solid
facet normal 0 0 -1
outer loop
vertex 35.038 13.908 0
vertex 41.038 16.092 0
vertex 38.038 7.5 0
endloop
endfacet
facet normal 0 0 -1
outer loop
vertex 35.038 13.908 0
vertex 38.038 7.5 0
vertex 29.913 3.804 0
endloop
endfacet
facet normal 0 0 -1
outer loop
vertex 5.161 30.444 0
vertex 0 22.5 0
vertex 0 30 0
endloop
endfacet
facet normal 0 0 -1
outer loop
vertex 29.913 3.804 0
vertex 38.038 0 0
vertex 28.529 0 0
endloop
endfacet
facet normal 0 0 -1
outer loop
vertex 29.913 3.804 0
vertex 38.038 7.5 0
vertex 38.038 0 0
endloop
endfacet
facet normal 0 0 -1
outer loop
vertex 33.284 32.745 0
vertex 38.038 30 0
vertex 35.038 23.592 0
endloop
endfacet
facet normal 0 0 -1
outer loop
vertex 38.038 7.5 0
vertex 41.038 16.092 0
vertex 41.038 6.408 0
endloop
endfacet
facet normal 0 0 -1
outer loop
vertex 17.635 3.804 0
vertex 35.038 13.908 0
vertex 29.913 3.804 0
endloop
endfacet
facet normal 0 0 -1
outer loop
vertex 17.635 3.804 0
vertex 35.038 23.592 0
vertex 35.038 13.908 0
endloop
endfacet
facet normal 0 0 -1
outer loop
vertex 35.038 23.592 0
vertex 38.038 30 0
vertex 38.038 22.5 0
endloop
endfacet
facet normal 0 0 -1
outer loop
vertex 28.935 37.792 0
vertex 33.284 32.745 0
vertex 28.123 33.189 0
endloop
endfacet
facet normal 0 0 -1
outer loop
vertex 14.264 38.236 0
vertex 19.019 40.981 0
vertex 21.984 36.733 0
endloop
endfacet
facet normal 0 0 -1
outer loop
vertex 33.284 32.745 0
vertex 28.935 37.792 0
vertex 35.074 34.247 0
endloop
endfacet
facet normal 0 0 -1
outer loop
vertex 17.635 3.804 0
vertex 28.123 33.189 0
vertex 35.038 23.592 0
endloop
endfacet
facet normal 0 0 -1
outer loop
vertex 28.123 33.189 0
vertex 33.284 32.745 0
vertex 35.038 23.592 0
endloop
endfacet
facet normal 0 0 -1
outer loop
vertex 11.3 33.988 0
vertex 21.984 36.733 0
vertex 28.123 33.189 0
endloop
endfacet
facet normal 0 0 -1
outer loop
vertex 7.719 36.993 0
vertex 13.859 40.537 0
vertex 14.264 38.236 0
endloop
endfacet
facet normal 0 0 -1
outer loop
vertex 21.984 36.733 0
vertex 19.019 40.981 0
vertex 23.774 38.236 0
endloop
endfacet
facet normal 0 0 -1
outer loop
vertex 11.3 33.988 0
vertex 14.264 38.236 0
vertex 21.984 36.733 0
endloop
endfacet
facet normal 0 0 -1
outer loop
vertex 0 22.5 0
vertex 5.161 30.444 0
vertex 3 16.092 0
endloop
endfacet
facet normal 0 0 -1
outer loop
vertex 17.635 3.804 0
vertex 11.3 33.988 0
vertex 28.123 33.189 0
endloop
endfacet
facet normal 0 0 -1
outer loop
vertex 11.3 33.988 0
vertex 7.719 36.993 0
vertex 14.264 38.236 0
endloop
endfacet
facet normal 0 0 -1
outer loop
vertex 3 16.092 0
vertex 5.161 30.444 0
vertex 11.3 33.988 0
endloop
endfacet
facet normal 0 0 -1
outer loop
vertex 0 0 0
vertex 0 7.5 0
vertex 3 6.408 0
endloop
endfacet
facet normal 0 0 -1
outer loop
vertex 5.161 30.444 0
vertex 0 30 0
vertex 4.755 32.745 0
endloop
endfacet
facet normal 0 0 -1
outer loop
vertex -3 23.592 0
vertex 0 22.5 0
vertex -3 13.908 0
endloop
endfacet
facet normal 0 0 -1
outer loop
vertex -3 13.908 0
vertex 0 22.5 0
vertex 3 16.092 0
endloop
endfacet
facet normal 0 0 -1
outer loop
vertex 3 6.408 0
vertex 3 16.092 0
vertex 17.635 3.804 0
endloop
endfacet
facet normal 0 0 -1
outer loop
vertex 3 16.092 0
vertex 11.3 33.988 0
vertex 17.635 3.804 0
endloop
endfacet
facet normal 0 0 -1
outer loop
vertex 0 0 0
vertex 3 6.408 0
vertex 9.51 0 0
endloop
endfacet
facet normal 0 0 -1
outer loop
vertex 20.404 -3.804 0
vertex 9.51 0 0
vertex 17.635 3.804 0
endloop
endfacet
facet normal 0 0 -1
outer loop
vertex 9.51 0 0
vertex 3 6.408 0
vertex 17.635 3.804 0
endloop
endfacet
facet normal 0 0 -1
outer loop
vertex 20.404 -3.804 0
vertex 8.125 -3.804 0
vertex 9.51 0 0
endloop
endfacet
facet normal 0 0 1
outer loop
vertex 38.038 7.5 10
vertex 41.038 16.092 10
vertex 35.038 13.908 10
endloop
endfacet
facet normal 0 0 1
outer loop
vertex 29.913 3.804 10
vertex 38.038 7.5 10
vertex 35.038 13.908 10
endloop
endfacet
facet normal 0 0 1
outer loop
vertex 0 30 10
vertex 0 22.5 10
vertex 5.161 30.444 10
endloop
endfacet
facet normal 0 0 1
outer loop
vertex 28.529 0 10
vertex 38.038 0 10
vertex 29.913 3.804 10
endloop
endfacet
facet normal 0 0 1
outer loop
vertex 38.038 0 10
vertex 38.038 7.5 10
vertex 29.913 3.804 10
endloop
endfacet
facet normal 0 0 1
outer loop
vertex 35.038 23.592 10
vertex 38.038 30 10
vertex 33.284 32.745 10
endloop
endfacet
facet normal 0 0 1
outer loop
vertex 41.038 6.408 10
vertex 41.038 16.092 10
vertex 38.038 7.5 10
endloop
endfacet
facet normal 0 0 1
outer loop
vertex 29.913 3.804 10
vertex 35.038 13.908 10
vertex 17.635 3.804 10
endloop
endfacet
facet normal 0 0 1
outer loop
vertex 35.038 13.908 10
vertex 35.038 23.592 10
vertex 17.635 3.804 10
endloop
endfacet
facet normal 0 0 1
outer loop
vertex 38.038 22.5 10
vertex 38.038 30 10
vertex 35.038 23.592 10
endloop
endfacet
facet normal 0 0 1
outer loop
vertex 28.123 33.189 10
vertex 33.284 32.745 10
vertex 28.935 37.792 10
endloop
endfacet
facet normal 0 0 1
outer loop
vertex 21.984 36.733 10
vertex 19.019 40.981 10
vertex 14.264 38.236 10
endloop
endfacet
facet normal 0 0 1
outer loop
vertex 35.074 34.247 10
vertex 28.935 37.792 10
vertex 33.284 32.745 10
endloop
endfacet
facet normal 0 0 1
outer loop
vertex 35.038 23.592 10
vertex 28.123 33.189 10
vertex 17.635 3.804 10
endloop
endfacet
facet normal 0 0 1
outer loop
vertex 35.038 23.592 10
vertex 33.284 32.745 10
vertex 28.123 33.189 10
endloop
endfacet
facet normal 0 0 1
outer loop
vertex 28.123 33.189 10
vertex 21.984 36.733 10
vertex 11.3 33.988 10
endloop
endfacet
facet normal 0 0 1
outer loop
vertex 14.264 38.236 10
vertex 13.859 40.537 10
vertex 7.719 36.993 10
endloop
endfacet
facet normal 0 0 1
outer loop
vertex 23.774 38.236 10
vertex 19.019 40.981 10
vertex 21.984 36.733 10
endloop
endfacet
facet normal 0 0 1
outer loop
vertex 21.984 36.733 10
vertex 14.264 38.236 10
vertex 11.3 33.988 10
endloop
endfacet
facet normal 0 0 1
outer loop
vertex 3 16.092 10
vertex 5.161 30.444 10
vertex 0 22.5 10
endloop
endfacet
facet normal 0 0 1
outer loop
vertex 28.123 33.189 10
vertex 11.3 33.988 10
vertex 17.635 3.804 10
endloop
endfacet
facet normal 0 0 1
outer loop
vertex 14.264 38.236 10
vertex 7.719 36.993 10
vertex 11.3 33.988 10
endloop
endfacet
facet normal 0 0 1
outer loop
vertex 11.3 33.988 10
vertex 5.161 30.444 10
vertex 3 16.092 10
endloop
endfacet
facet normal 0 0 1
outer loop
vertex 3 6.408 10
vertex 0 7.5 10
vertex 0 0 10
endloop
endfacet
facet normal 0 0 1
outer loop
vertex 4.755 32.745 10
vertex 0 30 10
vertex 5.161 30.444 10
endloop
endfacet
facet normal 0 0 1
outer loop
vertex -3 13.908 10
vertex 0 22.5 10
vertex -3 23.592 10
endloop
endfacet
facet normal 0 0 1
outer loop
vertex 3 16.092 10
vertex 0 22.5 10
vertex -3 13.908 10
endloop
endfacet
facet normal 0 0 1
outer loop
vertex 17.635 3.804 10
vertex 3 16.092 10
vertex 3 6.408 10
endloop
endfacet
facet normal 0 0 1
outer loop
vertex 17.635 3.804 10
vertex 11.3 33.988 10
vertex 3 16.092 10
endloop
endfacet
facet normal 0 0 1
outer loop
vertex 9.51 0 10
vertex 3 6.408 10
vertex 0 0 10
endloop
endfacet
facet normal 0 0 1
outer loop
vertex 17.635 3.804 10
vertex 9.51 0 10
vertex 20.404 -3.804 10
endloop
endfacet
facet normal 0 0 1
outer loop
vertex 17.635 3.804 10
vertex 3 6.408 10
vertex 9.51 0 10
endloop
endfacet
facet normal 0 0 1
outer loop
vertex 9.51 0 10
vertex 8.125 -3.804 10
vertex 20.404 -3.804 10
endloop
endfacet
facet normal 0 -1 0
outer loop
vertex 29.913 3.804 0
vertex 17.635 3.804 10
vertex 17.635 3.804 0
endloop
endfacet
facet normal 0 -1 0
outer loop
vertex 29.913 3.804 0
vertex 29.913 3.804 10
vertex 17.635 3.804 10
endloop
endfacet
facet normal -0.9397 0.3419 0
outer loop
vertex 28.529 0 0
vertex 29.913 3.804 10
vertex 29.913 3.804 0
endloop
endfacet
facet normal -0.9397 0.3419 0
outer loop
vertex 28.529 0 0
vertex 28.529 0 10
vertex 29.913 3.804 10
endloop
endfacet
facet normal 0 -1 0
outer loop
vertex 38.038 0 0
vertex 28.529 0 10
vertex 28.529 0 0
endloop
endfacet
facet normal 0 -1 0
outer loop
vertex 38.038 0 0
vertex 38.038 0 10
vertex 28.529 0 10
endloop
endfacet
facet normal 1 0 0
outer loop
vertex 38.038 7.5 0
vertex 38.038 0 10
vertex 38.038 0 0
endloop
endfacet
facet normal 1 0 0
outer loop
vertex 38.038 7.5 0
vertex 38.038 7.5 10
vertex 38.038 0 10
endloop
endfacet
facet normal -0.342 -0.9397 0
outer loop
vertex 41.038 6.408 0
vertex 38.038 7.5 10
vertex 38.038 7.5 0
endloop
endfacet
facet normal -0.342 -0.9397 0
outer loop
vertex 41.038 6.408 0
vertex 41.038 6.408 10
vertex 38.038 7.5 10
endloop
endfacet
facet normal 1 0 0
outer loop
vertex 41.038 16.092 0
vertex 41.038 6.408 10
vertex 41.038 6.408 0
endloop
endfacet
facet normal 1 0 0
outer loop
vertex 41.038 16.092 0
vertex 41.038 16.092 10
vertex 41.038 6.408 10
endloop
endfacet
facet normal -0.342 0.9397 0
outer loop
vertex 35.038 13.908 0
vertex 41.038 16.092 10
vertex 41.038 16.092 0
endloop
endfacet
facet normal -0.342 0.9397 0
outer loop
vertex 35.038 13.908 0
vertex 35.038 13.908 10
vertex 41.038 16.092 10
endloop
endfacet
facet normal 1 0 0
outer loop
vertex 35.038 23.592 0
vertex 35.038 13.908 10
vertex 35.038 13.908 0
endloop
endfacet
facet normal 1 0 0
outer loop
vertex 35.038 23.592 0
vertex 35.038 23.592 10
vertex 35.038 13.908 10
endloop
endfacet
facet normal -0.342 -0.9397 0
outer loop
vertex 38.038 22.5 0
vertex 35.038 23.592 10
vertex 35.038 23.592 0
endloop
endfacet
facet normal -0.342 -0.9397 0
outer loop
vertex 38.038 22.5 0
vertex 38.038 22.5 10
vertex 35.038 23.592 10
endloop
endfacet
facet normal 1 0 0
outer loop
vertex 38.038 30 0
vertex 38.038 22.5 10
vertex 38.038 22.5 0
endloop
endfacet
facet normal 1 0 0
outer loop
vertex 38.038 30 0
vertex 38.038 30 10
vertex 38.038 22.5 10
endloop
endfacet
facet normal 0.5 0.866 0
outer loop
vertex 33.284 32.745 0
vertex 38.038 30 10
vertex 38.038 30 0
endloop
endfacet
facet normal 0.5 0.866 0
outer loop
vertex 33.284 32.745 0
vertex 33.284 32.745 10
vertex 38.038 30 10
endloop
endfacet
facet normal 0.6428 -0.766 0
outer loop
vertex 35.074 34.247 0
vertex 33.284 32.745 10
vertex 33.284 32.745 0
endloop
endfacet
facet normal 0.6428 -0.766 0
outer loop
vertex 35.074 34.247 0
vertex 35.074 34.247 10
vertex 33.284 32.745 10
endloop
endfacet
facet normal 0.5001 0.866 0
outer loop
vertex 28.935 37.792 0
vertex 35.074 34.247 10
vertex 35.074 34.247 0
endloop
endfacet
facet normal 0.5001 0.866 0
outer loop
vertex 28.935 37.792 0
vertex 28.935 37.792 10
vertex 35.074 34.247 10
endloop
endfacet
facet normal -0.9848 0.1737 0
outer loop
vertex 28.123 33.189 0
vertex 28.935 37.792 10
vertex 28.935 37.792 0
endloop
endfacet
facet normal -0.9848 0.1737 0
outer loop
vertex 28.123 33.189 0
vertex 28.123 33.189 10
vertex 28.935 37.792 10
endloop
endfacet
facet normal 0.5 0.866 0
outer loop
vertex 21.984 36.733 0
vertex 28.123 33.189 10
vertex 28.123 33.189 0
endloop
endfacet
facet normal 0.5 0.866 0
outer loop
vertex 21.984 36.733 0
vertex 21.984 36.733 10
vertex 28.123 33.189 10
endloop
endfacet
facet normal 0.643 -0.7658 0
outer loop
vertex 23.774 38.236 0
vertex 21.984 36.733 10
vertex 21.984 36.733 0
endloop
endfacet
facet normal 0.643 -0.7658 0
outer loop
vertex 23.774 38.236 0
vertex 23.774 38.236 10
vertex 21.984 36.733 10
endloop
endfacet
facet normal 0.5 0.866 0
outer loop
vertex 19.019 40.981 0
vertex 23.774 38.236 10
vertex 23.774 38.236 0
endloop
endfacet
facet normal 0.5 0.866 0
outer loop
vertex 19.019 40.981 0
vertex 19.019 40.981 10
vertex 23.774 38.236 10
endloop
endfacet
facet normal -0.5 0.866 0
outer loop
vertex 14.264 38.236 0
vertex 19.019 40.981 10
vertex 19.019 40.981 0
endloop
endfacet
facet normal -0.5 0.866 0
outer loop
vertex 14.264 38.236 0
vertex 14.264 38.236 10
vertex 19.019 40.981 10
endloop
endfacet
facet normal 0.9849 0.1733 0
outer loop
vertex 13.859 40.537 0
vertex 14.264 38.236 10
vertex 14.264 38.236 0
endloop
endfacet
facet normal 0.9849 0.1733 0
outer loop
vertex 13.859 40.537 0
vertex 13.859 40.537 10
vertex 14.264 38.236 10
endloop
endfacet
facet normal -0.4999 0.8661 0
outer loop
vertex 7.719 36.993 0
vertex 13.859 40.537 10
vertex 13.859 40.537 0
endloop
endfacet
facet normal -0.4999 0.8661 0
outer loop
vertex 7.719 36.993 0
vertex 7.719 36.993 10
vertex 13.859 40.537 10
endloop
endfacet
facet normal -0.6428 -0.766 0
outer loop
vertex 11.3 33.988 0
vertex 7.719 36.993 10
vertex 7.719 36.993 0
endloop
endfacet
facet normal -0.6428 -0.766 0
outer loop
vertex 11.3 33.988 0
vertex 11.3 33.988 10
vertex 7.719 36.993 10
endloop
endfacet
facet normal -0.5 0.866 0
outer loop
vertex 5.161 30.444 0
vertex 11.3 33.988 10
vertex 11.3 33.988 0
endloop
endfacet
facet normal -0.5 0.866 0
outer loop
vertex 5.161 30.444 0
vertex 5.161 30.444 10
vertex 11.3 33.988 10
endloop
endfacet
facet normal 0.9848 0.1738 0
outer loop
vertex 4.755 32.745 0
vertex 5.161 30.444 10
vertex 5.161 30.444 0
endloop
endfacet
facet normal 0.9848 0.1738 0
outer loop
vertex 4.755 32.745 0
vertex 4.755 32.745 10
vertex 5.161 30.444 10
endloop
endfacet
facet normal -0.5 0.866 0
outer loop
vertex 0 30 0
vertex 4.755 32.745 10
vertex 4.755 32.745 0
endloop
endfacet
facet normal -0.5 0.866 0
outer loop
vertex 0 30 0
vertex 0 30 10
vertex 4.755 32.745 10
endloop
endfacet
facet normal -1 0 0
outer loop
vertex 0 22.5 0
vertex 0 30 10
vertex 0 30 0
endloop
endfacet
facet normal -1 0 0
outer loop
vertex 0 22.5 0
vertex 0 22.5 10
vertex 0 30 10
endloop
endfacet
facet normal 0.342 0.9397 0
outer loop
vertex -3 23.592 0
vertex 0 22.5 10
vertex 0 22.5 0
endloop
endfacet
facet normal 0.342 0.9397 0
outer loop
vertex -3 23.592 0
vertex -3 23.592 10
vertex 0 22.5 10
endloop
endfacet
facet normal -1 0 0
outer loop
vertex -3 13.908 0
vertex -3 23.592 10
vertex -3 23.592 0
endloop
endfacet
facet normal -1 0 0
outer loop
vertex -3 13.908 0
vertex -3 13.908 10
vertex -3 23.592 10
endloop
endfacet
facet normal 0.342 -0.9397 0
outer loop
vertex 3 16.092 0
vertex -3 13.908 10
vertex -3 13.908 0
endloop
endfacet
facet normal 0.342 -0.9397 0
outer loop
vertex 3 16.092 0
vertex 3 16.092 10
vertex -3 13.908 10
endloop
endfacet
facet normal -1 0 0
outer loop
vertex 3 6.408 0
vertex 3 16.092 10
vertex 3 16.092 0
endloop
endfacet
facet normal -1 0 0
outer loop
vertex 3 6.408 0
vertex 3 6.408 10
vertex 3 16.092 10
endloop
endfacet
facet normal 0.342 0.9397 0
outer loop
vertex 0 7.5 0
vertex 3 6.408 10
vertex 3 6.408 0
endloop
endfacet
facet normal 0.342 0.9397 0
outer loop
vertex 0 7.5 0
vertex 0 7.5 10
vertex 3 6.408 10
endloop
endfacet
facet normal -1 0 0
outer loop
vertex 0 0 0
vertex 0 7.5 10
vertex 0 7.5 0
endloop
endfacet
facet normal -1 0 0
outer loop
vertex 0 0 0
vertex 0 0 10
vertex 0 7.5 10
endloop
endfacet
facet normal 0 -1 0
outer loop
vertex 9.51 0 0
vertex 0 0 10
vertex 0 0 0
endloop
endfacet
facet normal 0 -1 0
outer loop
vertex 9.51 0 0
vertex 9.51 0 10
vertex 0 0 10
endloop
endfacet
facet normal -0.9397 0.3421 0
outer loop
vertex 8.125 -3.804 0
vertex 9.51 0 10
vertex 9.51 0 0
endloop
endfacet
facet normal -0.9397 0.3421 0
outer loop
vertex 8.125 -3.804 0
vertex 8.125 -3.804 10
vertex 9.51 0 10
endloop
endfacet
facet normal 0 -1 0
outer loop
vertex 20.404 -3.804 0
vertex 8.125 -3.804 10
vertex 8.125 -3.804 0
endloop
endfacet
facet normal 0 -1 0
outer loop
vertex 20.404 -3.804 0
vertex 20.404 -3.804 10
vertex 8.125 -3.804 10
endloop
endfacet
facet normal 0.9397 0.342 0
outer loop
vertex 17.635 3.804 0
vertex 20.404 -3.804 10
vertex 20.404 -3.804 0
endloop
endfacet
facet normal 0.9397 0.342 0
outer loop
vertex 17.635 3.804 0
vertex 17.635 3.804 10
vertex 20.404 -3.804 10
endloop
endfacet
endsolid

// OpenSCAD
//Cairo Pentagonal tile with tabs
// kit wallace 

// form 0 = cairo, 1 = prismatic
form=1;
//length of short side
side=30;
// tab angle 
angle=70;
//width of tab as ratio
tab_width = 0.5;
// depth of tab as ratio
tab_depth= 0.1;
// tile inset for kerf/tolerance - absolute
inset=0;
// height = 0 for 2D
height=10;


function cairo() =
    let(r = sqrt(3)-1)
    [[r,120],[1,90],[1,120],[1,90],[1,120]];
    
function prismatic() =
    let(r = sqrt(3)-1)
    let(t = r*sqrt(3))
    [[t,90],[1,120], [r,120],[r,120],[1,90]];
    
module tabbed_tile(side,peri,tab,inset,height) {
    tab_peri=scale_peri(replace_sides(peri,[tab]),side);
    tile = inset_tile(peri_to_tile(tab_peri),inset);
    if (height>0)
        linear_extrude(height=height)
           fill_tile(tile,"red");  
    else 
        fill_tile(tile,"red");  
}




peris = [cairo(),prismatic()];

tab=sym_tab(tab_width,tab_depth,angle);

peri=peris[form];

tabbed_tile(side,peri,tab,inset,height);
// extracts from tiling library  - not all needed in this script
module fill_tiles (tiles,colors=["lightgreen"]) {
    for (i=[0:len(tiles)-1]) {
       colors = colors[i % len(colors)];
       fill_tile(tiles[i],colors); 
    }
}
module fill_tile(tile,col="red") {
    color(col)
       polygon(3d_to_2d(tile)); 
};
 // functions
function sym_tab1(shoulder_ratio,inset,angle) =
[
     [shoulder_ratio/2, 360-angle],
     [inset/sin(angle), angle],
     [2*inset/tan(angle)+(1-shoulder_ratio)/2, angle],
     [2*inset/sin(angle), 360-angle],
     [2*inset/tan(angle)+(1-shoulder_ratio)/2, 360-angle],
     [inset/sin(angle),angle],
     [shoulder_ratio/2, 0]
     ];

function sym_tab(tab_width,tab_depth,angle) =
[
     [(1 - tab_width)/2, 360-angle],
     [tab_depth/sin(angle), angle],
     [2*tab_depth/tan(angle)+ tab_width/2, angle],
     [2*tab_depth/sin(angle), 360-angle],
     [2*tab_depth/tan(angle)+ tab_width /2, 360-angle],
     [tab_depth/sin(angle),angle],
     [(1 - tab_width)/2, 0]
     ];


function explode_tiles(tiles,factor) =
   [for (t=tiles)  
     let (c = v_centre(t))
     let (d = c*factor)
     translate_tile(t,d)
   ]
  ;

function inset_group(g,d)=
   [for (t=g)  inset_tile(t,d)];
  
// create list of transformations 
// apply the transformations

function group_transforms(tiles,assembly,group=[],transforms=[],i=0) =
    i==len(assembly)
        ? transforms
        : let(move = assembly[i])
          let(source = move[0])
          let(source_i=source[0])
          let(source_side=len(source)==2 ? source[1] :0)
          let(mirror = len(source)==3 ? 1 : 0)
          let(source_tile = mirror==1 ? mirror_tile(tiles[source_i]) : tiles[source_i] )
          len(move) ==1
             ? let (m = m_edge_to_edge(edge(source_tile,0),edge(source_tile,source_side)))
               let (nt = copy_tile(source_tile,m))
               let (t= [source_i,m,mirror])            
               group_transforms(tiles,assembly,concat(group,[nt]),concat(transforms,[t]),i+1)
             : let (dest = move[1])
               let (dest_i=dest[0])
               let (dest_tile=group[dest_i])
               let (dest_side=dest[1])
               let (end = len(dest)==3 ? 1 : 0)
               let (m = m_edge_to_edge(edge(source_tile,source_side),edge(dest_tile,dest_side,end)))
               let (nt = copy_tile(source_tile,m))
               let (t= [source_i,m,mirror])
               group_transforms(tiles,assembly,concat(group,[nt]),concat(transforms,[t]),i+1);

function apply_group_transforms(tiles,transforms,group=[],i=0) =
     i==len(transforms)
        ? group
        : let (transform = transforms[i])
          let (source_tile=tiles[transform[0]])
          let (m=transform[1])
          let (mirror = transform[2])
          let(nt = 
                   mirror
                       ?  copy_tile(mirror_tile(source_tile,m))
                       :  copy_tile(source_tile,m)
                       )
          apply_group_transforms(tiles,transforms,concat(group,[nt]),i+1);

function m_edge_to_edge(edge1, edge2,end=0) =
  // need to 
    let (start = (end==0 || end== undef) ? 1 : 0)
    let (a = angle_between(  
                edge2[1] - edge2[0],
                edge1[0] - edge1[1]))
    let (t1 = m_translate(-edge1[start]))
    let (r =  m_rotate([0,0,-a]))
    let (t2 = m_translate(edge2[end])) 
    t1*r*t2;

function copy_tile(tile,m) =
    [for (p = tile) transform(p,m)];


function m_translate(v) = [ [1, 0, 0, 0],
                            [0, 1, 0, 0],
                            [0, 0, 1, 0],
                            [v.x, v.y, v.z, 1  ] ];
                            
function m_rotate(v) =  [ [1,  0,         0,        0],
                          [0,  cos(v.x),  sin(v.x), 0],
                          [0, -sin(v.x),  cos(v.x), 0],
                          [0,  0,         0,        1] ]
                      * [ [ cos(v.y), 0,  -sin(v.y), 0],
                          [0,         1,  0,        0],
                          [ sin(v.y), 0,  cos(v.y), 0],
                          [0,         0,  0,        1] ]
                      * [ [ cos(v.z),  sin(v.z), 0, 0],
                          [-sin(v.z),  cos(v.z), 0, 0],
                          [ 0,         0,        1, 0],
                          [ 0,         0,        0, 1] ];
 
function m_scale(v,s) =
     depth(v)==2
      	? [ [v[0],0,0,0],
	        [0,v[1],0,0],
	        [0,0,v[2],0],
	        [0,0,0,1]
          ]
        : [ [v,0,0,0],
	        [0,v,0,0],
	        [0,0,v,0],
	        [0,0,0,1]
          ];
          
function vec3(v) = [v.x, v.y, v.z];
function transform(v, m)  = vec3([v.x, v.y, v.z, 1] * m);

function edge(points,i) =
   [points[i],points[(i +1) %len(points)]];

function replace_sides(peri,sides) =
 flatten( [for (i=[0:len(peri)-1])
      let (bside = peri[i])
      let (mside =  sides[i % len(sides)])
      let (mside_m = 
              len(mside) >1 
                 ? concat([for (i=[0:len(mside)-2]) mside[i]],[[mside[len(mside)-1][0],bside[1]]])
                 : [[mside[0][0],bside[1]]]
           )
      let (mside_length = peri_error(mside_m))
      let (mside_scaled = scale_peri(mside_m,bside[0]/mside_length))
      mside_scaled
  ]);

function peri_to_points(peri,pos=[0,0,0],dir=0,i=0) =
    i == len(peri)
      ? [pos]
      : let (side = peri[i])
        let (distance = side[0])
        let (newpos = pos + distance* [cos(dir), sin(dir),0])
        let (angle = side[1])
        let (newdir = dir + (180 - angle))
        concat([pos],peri_to_points(peri,newpos,newdir,i+1)) 
     ;                 

function peri_to_tile(peri,last=false) = 
    let (p = peri_to_points(norm_peri(peri)))  
    last 
       ? [for (i=[0:len(p)-1]) p[i]] 
       : [for (i=[0:len(p)-2]) p[i]]; 

function norm_peri(peri) =
     [for (p=peri)
        len(p)==undef
           ? [1,p]
           :[p.x,p.y] 
     ];
function repeat_peri(p,n) =
   norm_peri( flatten([for (i=[0:n-1]) p]));
    
function scale_peri(peri,scale) =
   [for (p=peri)
        len(p)==undef
           ? [scale,p]
           :[scale * p[0],p[1]] 
   ];
   
function peri_error(peri) = 
    norm(peri_end(peri));

function peri_end(peri) =
    let(t=peri_to_tile(peri,true))
    t[len(t)-1];    
  
function translate_tile(t,d) =
      [for (p=t) p+d]; 
        
function centre_tile(t) =
    let(c = v_avg(t))
    translate_tile(t,-c);

function inset_tile (tile, d=0.1) =
  [for (i=[0:len(tile)-1])
      let (v1 = unitv(tile[(i+len(tile) - 1 )% len(tile)] - tile[i]))
      let (v2 = unitv(tile[i] - tile[(i+1 )% len(tile)] ))
      let (vm = unitv((v1 - v2) /2))
      let (a = 180 - angle_between(v1,v2))
      let (offset = d / sin(a/2))
      tile[i]+offset * vm
  ];
  
 function angle_between(u, v) = 
     let (x= unitv(u) * unitv(v))
     let (y = x <= -1 ? -1 :x >= 1 ? 1 : x)
     let (a = acos(y))
     let (d = cross(u,v).z)
      d  > 0 ? a : 360- a;
  
function unitv(v)=  
   let (n = norm(v))
   n !=0 ? v/ norm(v) : v;
  
function 3d_to_2d(points)=
    [ for (p=points) [p.x,p.y]];
function v_avg(v) =v_sum(v) / len(v);
      
function zero(v) =
    len(v) == undef ? 0 : [for (i=[0:len(v)-1]) 0];
        
function v_sum_r(v,n,k) =
      k < n ?  v[k] + v_sum_r(v,n,k+1) : zero(v[0]) ;

function v_sum(v) = v_sum_r(v,len(v),0);
      
function flatten(l) = [ for (a = l) for (b = a) b ] ;
    
function v_centre(v) =  v_sum(v) / len(v);
